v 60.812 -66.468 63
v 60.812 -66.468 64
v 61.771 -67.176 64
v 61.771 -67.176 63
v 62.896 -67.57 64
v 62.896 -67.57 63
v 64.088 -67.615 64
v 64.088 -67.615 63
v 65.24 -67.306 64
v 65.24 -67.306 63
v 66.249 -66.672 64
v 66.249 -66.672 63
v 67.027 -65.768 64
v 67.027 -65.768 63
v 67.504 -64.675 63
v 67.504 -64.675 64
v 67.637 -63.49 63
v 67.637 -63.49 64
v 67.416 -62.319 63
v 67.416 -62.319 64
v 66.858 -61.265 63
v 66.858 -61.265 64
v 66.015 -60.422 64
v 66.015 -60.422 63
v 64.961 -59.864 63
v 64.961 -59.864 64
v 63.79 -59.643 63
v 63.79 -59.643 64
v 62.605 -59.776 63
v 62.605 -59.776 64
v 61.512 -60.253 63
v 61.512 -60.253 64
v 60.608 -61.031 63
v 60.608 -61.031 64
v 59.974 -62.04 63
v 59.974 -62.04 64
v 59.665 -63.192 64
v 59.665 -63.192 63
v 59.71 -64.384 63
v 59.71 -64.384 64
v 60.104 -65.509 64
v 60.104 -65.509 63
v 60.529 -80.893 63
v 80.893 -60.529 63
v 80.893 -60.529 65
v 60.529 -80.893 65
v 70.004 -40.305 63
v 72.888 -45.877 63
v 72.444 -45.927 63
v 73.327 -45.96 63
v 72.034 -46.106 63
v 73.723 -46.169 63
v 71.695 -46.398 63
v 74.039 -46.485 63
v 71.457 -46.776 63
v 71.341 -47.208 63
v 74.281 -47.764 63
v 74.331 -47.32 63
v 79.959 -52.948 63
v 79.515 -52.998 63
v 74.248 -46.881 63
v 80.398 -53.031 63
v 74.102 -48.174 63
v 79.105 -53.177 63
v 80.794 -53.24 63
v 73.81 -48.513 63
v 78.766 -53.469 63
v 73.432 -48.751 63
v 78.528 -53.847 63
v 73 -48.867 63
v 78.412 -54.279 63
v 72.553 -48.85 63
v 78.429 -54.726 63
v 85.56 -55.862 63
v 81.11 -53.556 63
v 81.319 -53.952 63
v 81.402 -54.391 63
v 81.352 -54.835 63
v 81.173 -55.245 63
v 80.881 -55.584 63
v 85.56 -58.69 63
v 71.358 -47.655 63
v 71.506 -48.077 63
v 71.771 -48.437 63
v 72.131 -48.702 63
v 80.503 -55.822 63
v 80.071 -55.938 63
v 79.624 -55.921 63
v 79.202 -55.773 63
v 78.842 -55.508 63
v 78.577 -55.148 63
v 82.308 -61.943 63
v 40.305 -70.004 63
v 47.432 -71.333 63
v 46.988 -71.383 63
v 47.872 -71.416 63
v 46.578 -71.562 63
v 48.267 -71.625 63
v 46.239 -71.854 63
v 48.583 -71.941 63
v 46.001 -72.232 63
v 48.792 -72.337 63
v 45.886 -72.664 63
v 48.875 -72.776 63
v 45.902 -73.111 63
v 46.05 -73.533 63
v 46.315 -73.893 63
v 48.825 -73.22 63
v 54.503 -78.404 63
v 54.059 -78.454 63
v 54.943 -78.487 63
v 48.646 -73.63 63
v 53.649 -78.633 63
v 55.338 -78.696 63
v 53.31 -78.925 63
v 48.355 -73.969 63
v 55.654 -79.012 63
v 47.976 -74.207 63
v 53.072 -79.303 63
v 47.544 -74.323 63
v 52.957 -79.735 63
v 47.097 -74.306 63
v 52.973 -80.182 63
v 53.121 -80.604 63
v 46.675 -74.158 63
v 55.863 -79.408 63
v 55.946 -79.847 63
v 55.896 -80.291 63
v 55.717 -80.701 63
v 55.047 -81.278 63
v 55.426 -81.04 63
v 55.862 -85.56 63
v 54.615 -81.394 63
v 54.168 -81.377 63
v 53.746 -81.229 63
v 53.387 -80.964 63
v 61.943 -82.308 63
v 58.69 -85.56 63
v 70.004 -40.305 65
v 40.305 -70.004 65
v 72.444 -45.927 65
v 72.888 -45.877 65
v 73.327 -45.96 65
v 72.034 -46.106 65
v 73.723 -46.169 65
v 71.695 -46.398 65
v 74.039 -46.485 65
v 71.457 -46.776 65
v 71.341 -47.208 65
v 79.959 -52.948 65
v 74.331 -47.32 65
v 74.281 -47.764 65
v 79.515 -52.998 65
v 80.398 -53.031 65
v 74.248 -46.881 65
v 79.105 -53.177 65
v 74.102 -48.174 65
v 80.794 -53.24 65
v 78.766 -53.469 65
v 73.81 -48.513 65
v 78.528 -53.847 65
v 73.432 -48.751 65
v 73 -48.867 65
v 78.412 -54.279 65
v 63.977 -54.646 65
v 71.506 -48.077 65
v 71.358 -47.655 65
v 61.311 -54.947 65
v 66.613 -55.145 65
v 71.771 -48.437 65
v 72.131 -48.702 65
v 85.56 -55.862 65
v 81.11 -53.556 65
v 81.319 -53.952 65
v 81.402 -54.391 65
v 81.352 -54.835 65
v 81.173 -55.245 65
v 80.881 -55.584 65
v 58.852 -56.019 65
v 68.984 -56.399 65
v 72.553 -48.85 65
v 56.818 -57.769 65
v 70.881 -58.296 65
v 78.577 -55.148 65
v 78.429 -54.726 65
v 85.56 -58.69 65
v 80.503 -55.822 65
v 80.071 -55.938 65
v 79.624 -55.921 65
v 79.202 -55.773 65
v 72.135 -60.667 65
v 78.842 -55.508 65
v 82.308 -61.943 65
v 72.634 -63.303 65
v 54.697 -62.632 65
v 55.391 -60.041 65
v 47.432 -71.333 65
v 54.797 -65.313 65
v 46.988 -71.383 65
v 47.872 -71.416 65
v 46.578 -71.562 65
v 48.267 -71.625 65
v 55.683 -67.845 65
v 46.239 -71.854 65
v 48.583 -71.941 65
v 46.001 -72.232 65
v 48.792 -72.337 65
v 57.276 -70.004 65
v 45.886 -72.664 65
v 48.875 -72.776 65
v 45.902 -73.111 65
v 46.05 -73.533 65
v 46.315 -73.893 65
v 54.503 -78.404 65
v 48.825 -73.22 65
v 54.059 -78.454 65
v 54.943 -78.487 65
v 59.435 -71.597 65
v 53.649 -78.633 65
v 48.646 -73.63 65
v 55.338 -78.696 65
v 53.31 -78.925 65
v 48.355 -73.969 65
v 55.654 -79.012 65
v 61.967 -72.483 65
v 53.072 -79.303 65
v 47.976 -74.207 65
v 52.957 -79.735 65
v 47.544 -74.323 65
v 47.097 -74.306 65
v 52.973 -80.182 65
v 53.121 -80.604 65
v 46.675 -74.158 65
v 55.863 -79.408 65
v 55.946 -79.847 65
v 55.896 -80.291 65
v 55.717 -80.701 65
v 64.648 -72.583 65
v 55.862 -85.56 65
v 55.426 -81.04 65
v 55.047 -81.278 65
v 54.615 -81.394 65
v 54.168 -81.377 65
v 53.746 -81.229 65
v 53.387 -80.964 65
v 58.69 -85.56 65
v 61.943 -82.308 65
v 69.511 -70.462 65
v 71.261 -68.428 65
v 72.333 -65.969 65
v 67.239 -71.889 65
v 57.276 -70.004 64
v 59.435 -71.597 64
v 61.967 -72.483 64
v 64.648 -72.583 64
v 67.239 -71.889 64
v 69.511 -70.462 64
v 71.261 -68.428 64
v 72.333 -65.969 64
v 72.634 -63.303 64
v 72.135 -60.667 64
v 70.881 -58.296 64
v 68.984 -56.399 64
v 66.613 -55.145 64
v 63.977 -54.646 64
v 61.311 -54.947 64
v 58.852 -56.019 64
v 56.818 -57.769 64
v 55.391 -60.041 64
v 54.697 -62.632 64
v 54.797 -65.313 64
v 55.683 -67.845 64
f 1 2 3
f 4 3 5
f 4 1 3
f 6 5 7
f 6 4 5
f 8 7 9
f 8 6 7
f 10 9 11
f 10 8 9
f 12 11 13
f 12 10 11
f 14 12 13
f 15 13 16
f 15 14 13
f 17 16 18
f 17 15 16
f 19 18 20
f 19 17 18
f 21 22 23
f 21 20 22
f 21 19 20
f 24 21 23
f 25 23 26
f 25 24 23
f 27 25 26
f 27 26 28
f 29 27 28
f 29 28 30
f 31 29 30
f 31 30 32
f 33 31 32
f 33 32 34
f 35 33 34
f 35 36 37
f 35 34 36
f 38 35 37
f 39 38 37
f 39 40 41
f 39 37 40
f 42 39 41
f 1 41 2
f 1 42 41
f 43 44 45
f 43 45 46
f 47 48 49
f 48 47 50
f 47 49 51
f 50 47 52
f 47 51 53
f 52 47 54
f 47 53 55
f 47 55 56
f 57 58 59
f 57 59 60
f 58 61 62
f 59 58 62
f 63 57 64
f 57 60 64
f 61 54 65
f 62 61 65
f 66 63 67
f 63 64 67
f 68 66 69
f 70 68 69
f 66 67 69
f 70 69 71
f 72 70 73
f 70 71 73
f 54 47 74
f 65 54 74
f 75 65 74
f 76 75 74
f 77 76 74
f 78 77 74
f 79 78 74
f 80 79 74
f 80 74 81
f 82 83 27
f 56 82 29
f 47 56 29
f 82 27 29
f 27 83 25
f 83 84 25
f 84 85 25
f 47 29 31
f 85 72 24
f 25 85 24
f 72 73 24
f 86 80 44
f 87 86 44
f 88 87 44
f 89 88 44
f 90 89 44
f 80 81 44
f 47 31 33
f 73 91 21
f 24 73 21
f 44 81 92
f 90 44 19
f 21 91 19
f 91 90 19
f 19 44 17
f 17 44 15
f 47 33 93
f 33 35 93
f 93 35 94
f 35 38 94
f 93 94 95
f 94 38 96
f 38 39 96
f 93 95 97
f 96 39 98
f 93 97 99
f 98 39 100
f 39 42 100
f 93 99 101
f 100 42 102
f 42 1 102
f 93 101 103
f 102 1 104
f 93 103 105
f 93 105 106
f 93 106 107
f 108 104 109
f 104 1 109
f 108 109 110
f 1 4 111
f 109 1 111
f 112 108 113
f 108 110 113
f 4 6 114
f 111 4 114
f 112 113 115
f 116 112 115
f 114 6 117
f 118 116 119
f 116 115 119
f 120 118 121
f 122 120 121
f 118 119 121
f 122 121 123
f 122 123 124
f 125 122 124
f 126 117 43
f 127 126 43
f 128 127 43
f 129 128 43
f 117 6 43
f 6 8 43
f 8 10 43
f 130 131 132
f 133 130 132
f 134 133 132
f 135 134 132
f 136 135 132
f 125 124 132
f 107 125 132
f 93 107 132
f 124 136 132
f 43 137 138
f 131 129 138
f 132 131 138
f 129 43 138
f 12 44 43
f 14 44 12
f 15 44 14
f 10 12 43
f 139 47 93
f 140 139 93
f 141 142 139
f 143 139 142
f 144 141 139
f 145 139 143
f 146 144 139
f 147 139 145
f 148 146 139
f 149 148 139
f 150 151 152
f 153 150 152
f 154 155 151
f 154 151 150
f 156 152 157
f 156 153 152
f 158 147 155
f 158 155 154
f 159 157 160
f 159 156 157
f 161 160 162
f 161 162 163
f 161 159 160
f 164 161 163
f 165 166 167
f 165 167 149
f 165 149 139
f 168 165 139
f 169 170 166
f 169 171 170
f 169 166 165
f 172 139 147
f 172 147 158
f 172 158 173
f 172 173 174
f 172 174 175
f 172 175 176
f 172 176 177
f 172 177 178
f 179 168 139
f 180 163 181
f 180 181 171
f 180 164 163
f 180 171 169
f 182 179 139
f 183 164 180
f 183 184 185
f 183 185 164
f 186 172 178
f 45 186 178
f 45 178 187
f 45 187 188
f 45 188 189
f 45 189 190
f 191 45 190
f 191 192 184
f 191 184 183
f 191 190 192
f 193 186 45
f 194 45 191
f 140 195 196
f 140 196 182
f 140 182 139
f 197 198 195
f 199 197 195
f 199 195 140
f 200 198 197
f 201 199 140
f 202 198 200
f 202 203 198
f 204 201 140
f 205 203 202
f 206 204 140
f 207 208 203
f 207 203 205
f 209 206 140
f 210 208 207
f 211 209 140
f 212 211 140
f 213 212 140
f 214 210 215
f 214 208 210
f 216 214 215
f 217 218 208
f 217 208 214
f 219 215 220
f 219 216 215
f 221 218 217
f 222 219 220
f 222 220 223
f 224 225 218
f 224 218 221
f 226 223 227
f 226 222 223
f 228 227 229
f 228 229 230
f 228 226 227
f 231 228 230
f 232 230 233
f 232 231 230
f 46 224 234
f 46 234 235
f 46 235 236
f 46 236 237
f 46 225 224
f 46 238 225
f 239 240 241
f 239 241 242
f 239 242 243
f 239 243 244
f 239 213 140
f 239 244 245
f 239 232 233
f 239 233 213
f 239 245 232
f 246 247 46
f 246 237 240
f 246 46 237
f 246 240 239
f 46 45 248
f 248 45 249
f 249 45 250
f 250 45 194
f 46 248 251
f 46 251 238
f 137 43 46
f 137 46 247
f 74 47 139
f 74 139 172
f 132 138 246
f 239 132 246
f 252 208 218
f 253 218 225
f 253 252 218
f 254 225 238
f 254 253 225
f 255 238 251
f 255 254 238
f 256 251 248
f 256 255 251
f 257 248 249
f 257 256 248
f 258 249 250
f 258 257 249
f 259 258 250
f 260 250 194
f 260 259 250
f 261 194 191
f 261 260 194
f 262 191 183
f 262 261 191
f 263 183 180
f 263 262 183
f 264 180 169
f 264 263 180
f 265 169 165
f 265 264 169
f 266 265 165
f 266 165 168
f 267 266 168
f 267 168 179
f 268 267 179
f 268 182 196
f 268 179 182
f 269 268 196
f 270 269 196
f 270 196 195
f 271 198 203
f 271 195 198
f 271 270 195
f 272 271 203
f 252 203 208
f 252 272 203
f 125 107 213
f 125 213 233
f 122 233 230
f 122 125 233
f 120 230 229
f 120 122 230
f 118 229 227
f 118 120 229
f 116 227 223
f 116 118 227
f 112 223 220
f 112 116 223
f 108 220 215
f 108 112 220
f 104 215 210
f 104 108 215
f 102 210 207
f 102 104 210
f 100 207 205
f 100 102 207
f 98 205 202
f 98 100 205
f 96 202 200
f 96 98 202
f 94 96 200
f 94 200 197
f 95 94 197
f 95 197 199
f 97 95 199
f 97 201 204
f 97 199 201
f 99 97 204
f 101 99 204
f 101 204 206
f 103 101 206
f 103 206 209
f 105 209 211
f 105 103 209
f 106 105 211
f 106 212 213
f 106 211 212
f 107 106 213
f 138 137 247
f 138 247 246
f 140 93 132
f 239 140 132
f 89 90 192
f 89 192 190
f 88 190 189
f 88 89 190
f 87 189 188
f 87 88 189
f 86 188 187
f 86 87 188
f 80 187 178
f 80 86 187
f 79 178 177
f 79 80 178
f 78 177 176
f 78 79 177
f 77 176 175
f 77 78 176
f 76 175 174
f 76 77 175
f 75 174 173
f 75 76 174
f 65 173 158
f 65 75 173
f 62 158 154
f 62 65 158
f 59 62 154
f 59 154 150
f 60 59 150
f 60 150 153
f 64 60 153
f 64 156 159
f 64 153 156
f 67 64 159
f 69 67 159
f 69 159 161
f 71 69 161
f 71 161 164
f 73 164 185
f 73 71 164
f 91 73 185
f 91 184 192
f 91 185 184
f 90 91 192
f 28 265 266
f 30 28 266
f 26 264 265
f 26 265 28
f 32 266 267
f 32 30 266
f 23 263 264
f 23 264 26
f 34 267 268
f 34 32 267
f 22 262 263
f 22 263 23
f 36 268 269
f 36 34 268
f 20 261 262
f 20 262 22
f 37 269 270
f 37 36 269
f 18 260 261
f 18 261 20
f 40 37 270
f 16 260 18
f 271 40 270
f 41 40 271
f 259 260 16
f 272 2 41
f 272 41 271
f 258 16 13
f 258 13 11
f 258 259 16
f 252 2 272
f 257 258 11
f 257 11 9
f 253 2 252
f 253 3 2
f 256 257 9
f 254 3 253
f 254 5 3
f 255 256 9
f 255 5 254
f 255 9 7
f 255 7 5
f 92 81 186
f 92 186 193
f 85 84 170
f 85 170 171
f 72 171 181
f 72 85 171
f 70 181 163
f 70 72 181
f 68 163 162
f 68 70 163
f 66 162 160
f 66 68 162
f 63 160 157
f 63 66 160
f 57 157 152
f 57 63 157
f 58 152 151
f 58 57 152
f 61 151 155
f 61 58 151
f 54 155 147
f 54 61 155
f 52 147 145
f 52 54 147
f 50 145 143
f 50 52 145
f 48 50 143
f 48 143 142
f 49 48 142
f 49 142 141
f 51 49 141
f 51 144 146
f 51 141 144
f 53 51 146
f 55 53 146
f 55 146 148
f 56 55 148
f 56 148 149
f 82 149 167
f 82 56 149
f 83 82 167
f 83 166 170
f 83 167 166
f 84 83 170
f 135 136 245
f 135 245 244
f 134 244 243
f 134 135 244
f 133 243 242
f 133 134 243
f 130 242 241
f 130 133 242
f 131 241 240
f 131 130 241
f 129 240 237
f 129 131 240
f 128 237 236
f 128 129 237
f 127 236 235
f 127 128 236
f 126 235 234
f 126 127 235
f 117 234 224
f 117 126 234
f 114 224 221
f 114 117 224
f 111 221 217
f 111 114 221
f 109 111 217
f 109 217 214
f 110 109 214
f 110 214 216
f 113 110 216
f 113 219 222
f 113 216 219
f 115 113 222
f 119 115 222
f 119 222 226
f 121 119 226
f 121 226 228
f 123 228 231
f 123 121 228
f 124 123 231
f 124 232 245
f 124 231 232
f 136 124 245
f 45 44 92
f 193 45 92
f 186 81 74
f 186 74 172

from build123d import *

# Parameters (mm, degrees)
CYLINDER1760_R               = 9
CYLINDER1760_DEPTH           = 4
CYLINDER1760_PLACEMENT_ANGLE = 225
BOX711_W                     = 28.8
BOX711_H                     = 2
BOX711_DEPTH                 = 4
COMPOUND890_PLACEMENT_ANGLE  = 225
CYLINDER1692_R               = 1.5
CYLINDER1692_DEPTH           = 60
CYLINDER1689_R               = 1.5
CYLINDER1689_DEPTH           = 60
CYLINDER1690_R               = 1.5
CYLINDER1690_DEPTH           = 60
CYLINDER1691_R               = 1.5
CYLINDER1691_DEPTH           = 60
COMPOUND833_PLACEMENT_ANGLE  = 225
CYLINDER1645_R               = 4
CYLINDER1645_DEPTH           = 4
CYLINDER1645_PLACEMENT_ANGLE = 225
BOX657_W                     = 42
BOX657_H                     = 24
BOX657_DEPTH                 = 2
COMPOUND818_PLACEMENT_ANGLE  = 225
CHAMFER058_SIZE              = 2


with BuildPart() as v_lec1760:
    # Cylinder1760 → Cylinder1760 (new body)
    with BuildSketch(Plane.XY):
        Circle(CYLINDER1760_R)
    extrude(amount=CYLINDER1760_DEPTH)


with BuildPart() as v_lec1760_1:
    # Cylinder1760 placement: moved
    add(v_lec1760.part.moved(Location((63.64, -63.64, 64))).rotate(Axis((63.64, -63.64, 64), (0, 0, 1)), CYLINDER1760_PLACEMENT_ANGLE))


with BuildPart() as compound890:
    # Box711 → Box711 (new body)
    with BuildSketch(Plane(origin=(-14.4, 10, 24), x_dir=(1, 0, 0), z_dir=(0, 0, 1))):
        with Locations((14.4, 1)):
            Rectangle(BOX711_W, BOX711_H)
    extrude(amount=BOX711_DEPTH)


with BuildPart() as compound890_1:
    # Compound890 placement: moved
    add(compound890.part.moved(Location((63.64, -63.64, 38))).rotate(Axis((63.64, -63.64, 38), (0, 0, 1)), COMPOUND890_PLACEMENT_ANGLE))


with BuildPart() as v_lec1692:
    # Cylinder1692 → Cylinder1692 (new body)
    with BuildSketch(Plane(origin=(18, 85, -57), x_dir=(1, 0, 0), z_dir=(0, 0, 1))):
        Circle(CYLINDER1692_R)
    extrude(amount=CYLINDER1692_DEPTH)


with BuildPart() as v_lec1689:
    # Cylinder1689 → Cylinder1689 (new body)
    with BuildSketch(Plane(origin=(-18, 85, -57), x_dir=(1, 0, 0), z_dir=(0, 0, 1))):
        Circle(CYLINDER1689_R)
    extrude(amount=CYLINDER1689_DEPTH)


with BuildPart() as v_lec1690:
    # Cylinder1690 → Cylinder1690 (new body)
    with BuildSketch(Plane(origin=(-18, 95, -57), x_dir=(1, 0, 0), z_dir=(0, 0, 1))):
        Circle(CYLINDER1690_R)
    extrude(amount=CYLINDER1690_DEPTH)


with BuildPart() as compound833:
    # Cylinder1691 → Cylinder1691 (new body)
    with BuildSketch(Plane(origin=(18, 95, -57), x_dir=(1, 0, 0), z_dir=(0, 0, 1))):
        Circle(CYLINDER1691_R)
    extrude(amount=CYLINDER1691_DEPTH)

    # Compound833: union Válec1692, Válec1689, Válec1690
    add(v_lec1692.part)
    add(v_lec1689.part)
    add(v_lec1690.part)


with BuildPart() as compound833_1:
    # Compound833 placement: moved
    add(compound833.part.moved(Location((0, 0, 100))).rotate(Axis((0, 0, 100), (0, 0, 1)), COMPOUND833_PLACEMENT_ANGLE))


with BuildPart() as v_lec1645:
    # Cylinder1645 → Cylinder1645 (new body)
    with BuildSketch(Plane.XY):
        Circle(CYLINDER1645_R)
    extrude(amount=CYLINDER1645_DEPTH)


with BuildPart() as v_lec1645_1:
    # Cylinder1645 placement: moved
    add(v_lec1645.part.moved(Location((63.64, -63.64, 76))).rotate(Axis((63.64, -63.64, 76), (0, 0, 1)), CYLINDER1645_PLACEMENT_ANGLE))


with BuildPart() as base_encoder_washer:
    # Box657 → Box657 (new body)
    with BuildSketch(Plane(origin=(-21, -12, 34), x_dir=(1, 0, 0), z_dir=(0, 0, 1))):
        with Locations((21, 12)):
            Rectangle(BOX657_W, BOX657_H)
    extrude(amount=BOX657_DEPTH)


with BuildPart() as base_encoder_washer_1:
    # Compound818 placement: moved
    add(base_encoder_washer.part.moved(Location((63.64, -63.64, 42))).rotate(Axis((63.64, -63.64, 42), (0, 0, 1)), COMPOUND818_PLACEMENT_ANGLE))

    # Cut472: cut Válec1645
    add(v_lec1645_1.part, mode=Mode.SUBTRACT)


with BuildPart() as base_encoder_washer_2:
    # Cut472 placement: moved
    add(base_encoder_washer_1.part.moved(Location((0, 0, -10))))

    # Cut481: cut Compound833
    add(compound833_1.part, mode=Mode.SUBTRACT)


with BuildPart() as base_encoder_washer_3:
    # Cut481 placement: moved
    add(base_encoder_washer_2.part.moved(Location((0, 0, -3))))

    # Cut522: cut Compound890
    add(compound890_1.part, mode=Mode.SUBTRACT)

    # Cut523: cut Válec1760
    add(v_lec1760_1.part, mode=Mode.SUBTRACT)

    # Chamfer058
    chamfer058_edges = [base_encoder_washer_3.edges().sort_by_distance(p)[0] for p in [
        (86.974524, -57.276039, 64),
        (57.276039, -86.974524, 64),
    ]]
    chamfer(chamfer058_edges, length=CHAMFER058_SIZE)


solid = base_encoder_washer_3.part
